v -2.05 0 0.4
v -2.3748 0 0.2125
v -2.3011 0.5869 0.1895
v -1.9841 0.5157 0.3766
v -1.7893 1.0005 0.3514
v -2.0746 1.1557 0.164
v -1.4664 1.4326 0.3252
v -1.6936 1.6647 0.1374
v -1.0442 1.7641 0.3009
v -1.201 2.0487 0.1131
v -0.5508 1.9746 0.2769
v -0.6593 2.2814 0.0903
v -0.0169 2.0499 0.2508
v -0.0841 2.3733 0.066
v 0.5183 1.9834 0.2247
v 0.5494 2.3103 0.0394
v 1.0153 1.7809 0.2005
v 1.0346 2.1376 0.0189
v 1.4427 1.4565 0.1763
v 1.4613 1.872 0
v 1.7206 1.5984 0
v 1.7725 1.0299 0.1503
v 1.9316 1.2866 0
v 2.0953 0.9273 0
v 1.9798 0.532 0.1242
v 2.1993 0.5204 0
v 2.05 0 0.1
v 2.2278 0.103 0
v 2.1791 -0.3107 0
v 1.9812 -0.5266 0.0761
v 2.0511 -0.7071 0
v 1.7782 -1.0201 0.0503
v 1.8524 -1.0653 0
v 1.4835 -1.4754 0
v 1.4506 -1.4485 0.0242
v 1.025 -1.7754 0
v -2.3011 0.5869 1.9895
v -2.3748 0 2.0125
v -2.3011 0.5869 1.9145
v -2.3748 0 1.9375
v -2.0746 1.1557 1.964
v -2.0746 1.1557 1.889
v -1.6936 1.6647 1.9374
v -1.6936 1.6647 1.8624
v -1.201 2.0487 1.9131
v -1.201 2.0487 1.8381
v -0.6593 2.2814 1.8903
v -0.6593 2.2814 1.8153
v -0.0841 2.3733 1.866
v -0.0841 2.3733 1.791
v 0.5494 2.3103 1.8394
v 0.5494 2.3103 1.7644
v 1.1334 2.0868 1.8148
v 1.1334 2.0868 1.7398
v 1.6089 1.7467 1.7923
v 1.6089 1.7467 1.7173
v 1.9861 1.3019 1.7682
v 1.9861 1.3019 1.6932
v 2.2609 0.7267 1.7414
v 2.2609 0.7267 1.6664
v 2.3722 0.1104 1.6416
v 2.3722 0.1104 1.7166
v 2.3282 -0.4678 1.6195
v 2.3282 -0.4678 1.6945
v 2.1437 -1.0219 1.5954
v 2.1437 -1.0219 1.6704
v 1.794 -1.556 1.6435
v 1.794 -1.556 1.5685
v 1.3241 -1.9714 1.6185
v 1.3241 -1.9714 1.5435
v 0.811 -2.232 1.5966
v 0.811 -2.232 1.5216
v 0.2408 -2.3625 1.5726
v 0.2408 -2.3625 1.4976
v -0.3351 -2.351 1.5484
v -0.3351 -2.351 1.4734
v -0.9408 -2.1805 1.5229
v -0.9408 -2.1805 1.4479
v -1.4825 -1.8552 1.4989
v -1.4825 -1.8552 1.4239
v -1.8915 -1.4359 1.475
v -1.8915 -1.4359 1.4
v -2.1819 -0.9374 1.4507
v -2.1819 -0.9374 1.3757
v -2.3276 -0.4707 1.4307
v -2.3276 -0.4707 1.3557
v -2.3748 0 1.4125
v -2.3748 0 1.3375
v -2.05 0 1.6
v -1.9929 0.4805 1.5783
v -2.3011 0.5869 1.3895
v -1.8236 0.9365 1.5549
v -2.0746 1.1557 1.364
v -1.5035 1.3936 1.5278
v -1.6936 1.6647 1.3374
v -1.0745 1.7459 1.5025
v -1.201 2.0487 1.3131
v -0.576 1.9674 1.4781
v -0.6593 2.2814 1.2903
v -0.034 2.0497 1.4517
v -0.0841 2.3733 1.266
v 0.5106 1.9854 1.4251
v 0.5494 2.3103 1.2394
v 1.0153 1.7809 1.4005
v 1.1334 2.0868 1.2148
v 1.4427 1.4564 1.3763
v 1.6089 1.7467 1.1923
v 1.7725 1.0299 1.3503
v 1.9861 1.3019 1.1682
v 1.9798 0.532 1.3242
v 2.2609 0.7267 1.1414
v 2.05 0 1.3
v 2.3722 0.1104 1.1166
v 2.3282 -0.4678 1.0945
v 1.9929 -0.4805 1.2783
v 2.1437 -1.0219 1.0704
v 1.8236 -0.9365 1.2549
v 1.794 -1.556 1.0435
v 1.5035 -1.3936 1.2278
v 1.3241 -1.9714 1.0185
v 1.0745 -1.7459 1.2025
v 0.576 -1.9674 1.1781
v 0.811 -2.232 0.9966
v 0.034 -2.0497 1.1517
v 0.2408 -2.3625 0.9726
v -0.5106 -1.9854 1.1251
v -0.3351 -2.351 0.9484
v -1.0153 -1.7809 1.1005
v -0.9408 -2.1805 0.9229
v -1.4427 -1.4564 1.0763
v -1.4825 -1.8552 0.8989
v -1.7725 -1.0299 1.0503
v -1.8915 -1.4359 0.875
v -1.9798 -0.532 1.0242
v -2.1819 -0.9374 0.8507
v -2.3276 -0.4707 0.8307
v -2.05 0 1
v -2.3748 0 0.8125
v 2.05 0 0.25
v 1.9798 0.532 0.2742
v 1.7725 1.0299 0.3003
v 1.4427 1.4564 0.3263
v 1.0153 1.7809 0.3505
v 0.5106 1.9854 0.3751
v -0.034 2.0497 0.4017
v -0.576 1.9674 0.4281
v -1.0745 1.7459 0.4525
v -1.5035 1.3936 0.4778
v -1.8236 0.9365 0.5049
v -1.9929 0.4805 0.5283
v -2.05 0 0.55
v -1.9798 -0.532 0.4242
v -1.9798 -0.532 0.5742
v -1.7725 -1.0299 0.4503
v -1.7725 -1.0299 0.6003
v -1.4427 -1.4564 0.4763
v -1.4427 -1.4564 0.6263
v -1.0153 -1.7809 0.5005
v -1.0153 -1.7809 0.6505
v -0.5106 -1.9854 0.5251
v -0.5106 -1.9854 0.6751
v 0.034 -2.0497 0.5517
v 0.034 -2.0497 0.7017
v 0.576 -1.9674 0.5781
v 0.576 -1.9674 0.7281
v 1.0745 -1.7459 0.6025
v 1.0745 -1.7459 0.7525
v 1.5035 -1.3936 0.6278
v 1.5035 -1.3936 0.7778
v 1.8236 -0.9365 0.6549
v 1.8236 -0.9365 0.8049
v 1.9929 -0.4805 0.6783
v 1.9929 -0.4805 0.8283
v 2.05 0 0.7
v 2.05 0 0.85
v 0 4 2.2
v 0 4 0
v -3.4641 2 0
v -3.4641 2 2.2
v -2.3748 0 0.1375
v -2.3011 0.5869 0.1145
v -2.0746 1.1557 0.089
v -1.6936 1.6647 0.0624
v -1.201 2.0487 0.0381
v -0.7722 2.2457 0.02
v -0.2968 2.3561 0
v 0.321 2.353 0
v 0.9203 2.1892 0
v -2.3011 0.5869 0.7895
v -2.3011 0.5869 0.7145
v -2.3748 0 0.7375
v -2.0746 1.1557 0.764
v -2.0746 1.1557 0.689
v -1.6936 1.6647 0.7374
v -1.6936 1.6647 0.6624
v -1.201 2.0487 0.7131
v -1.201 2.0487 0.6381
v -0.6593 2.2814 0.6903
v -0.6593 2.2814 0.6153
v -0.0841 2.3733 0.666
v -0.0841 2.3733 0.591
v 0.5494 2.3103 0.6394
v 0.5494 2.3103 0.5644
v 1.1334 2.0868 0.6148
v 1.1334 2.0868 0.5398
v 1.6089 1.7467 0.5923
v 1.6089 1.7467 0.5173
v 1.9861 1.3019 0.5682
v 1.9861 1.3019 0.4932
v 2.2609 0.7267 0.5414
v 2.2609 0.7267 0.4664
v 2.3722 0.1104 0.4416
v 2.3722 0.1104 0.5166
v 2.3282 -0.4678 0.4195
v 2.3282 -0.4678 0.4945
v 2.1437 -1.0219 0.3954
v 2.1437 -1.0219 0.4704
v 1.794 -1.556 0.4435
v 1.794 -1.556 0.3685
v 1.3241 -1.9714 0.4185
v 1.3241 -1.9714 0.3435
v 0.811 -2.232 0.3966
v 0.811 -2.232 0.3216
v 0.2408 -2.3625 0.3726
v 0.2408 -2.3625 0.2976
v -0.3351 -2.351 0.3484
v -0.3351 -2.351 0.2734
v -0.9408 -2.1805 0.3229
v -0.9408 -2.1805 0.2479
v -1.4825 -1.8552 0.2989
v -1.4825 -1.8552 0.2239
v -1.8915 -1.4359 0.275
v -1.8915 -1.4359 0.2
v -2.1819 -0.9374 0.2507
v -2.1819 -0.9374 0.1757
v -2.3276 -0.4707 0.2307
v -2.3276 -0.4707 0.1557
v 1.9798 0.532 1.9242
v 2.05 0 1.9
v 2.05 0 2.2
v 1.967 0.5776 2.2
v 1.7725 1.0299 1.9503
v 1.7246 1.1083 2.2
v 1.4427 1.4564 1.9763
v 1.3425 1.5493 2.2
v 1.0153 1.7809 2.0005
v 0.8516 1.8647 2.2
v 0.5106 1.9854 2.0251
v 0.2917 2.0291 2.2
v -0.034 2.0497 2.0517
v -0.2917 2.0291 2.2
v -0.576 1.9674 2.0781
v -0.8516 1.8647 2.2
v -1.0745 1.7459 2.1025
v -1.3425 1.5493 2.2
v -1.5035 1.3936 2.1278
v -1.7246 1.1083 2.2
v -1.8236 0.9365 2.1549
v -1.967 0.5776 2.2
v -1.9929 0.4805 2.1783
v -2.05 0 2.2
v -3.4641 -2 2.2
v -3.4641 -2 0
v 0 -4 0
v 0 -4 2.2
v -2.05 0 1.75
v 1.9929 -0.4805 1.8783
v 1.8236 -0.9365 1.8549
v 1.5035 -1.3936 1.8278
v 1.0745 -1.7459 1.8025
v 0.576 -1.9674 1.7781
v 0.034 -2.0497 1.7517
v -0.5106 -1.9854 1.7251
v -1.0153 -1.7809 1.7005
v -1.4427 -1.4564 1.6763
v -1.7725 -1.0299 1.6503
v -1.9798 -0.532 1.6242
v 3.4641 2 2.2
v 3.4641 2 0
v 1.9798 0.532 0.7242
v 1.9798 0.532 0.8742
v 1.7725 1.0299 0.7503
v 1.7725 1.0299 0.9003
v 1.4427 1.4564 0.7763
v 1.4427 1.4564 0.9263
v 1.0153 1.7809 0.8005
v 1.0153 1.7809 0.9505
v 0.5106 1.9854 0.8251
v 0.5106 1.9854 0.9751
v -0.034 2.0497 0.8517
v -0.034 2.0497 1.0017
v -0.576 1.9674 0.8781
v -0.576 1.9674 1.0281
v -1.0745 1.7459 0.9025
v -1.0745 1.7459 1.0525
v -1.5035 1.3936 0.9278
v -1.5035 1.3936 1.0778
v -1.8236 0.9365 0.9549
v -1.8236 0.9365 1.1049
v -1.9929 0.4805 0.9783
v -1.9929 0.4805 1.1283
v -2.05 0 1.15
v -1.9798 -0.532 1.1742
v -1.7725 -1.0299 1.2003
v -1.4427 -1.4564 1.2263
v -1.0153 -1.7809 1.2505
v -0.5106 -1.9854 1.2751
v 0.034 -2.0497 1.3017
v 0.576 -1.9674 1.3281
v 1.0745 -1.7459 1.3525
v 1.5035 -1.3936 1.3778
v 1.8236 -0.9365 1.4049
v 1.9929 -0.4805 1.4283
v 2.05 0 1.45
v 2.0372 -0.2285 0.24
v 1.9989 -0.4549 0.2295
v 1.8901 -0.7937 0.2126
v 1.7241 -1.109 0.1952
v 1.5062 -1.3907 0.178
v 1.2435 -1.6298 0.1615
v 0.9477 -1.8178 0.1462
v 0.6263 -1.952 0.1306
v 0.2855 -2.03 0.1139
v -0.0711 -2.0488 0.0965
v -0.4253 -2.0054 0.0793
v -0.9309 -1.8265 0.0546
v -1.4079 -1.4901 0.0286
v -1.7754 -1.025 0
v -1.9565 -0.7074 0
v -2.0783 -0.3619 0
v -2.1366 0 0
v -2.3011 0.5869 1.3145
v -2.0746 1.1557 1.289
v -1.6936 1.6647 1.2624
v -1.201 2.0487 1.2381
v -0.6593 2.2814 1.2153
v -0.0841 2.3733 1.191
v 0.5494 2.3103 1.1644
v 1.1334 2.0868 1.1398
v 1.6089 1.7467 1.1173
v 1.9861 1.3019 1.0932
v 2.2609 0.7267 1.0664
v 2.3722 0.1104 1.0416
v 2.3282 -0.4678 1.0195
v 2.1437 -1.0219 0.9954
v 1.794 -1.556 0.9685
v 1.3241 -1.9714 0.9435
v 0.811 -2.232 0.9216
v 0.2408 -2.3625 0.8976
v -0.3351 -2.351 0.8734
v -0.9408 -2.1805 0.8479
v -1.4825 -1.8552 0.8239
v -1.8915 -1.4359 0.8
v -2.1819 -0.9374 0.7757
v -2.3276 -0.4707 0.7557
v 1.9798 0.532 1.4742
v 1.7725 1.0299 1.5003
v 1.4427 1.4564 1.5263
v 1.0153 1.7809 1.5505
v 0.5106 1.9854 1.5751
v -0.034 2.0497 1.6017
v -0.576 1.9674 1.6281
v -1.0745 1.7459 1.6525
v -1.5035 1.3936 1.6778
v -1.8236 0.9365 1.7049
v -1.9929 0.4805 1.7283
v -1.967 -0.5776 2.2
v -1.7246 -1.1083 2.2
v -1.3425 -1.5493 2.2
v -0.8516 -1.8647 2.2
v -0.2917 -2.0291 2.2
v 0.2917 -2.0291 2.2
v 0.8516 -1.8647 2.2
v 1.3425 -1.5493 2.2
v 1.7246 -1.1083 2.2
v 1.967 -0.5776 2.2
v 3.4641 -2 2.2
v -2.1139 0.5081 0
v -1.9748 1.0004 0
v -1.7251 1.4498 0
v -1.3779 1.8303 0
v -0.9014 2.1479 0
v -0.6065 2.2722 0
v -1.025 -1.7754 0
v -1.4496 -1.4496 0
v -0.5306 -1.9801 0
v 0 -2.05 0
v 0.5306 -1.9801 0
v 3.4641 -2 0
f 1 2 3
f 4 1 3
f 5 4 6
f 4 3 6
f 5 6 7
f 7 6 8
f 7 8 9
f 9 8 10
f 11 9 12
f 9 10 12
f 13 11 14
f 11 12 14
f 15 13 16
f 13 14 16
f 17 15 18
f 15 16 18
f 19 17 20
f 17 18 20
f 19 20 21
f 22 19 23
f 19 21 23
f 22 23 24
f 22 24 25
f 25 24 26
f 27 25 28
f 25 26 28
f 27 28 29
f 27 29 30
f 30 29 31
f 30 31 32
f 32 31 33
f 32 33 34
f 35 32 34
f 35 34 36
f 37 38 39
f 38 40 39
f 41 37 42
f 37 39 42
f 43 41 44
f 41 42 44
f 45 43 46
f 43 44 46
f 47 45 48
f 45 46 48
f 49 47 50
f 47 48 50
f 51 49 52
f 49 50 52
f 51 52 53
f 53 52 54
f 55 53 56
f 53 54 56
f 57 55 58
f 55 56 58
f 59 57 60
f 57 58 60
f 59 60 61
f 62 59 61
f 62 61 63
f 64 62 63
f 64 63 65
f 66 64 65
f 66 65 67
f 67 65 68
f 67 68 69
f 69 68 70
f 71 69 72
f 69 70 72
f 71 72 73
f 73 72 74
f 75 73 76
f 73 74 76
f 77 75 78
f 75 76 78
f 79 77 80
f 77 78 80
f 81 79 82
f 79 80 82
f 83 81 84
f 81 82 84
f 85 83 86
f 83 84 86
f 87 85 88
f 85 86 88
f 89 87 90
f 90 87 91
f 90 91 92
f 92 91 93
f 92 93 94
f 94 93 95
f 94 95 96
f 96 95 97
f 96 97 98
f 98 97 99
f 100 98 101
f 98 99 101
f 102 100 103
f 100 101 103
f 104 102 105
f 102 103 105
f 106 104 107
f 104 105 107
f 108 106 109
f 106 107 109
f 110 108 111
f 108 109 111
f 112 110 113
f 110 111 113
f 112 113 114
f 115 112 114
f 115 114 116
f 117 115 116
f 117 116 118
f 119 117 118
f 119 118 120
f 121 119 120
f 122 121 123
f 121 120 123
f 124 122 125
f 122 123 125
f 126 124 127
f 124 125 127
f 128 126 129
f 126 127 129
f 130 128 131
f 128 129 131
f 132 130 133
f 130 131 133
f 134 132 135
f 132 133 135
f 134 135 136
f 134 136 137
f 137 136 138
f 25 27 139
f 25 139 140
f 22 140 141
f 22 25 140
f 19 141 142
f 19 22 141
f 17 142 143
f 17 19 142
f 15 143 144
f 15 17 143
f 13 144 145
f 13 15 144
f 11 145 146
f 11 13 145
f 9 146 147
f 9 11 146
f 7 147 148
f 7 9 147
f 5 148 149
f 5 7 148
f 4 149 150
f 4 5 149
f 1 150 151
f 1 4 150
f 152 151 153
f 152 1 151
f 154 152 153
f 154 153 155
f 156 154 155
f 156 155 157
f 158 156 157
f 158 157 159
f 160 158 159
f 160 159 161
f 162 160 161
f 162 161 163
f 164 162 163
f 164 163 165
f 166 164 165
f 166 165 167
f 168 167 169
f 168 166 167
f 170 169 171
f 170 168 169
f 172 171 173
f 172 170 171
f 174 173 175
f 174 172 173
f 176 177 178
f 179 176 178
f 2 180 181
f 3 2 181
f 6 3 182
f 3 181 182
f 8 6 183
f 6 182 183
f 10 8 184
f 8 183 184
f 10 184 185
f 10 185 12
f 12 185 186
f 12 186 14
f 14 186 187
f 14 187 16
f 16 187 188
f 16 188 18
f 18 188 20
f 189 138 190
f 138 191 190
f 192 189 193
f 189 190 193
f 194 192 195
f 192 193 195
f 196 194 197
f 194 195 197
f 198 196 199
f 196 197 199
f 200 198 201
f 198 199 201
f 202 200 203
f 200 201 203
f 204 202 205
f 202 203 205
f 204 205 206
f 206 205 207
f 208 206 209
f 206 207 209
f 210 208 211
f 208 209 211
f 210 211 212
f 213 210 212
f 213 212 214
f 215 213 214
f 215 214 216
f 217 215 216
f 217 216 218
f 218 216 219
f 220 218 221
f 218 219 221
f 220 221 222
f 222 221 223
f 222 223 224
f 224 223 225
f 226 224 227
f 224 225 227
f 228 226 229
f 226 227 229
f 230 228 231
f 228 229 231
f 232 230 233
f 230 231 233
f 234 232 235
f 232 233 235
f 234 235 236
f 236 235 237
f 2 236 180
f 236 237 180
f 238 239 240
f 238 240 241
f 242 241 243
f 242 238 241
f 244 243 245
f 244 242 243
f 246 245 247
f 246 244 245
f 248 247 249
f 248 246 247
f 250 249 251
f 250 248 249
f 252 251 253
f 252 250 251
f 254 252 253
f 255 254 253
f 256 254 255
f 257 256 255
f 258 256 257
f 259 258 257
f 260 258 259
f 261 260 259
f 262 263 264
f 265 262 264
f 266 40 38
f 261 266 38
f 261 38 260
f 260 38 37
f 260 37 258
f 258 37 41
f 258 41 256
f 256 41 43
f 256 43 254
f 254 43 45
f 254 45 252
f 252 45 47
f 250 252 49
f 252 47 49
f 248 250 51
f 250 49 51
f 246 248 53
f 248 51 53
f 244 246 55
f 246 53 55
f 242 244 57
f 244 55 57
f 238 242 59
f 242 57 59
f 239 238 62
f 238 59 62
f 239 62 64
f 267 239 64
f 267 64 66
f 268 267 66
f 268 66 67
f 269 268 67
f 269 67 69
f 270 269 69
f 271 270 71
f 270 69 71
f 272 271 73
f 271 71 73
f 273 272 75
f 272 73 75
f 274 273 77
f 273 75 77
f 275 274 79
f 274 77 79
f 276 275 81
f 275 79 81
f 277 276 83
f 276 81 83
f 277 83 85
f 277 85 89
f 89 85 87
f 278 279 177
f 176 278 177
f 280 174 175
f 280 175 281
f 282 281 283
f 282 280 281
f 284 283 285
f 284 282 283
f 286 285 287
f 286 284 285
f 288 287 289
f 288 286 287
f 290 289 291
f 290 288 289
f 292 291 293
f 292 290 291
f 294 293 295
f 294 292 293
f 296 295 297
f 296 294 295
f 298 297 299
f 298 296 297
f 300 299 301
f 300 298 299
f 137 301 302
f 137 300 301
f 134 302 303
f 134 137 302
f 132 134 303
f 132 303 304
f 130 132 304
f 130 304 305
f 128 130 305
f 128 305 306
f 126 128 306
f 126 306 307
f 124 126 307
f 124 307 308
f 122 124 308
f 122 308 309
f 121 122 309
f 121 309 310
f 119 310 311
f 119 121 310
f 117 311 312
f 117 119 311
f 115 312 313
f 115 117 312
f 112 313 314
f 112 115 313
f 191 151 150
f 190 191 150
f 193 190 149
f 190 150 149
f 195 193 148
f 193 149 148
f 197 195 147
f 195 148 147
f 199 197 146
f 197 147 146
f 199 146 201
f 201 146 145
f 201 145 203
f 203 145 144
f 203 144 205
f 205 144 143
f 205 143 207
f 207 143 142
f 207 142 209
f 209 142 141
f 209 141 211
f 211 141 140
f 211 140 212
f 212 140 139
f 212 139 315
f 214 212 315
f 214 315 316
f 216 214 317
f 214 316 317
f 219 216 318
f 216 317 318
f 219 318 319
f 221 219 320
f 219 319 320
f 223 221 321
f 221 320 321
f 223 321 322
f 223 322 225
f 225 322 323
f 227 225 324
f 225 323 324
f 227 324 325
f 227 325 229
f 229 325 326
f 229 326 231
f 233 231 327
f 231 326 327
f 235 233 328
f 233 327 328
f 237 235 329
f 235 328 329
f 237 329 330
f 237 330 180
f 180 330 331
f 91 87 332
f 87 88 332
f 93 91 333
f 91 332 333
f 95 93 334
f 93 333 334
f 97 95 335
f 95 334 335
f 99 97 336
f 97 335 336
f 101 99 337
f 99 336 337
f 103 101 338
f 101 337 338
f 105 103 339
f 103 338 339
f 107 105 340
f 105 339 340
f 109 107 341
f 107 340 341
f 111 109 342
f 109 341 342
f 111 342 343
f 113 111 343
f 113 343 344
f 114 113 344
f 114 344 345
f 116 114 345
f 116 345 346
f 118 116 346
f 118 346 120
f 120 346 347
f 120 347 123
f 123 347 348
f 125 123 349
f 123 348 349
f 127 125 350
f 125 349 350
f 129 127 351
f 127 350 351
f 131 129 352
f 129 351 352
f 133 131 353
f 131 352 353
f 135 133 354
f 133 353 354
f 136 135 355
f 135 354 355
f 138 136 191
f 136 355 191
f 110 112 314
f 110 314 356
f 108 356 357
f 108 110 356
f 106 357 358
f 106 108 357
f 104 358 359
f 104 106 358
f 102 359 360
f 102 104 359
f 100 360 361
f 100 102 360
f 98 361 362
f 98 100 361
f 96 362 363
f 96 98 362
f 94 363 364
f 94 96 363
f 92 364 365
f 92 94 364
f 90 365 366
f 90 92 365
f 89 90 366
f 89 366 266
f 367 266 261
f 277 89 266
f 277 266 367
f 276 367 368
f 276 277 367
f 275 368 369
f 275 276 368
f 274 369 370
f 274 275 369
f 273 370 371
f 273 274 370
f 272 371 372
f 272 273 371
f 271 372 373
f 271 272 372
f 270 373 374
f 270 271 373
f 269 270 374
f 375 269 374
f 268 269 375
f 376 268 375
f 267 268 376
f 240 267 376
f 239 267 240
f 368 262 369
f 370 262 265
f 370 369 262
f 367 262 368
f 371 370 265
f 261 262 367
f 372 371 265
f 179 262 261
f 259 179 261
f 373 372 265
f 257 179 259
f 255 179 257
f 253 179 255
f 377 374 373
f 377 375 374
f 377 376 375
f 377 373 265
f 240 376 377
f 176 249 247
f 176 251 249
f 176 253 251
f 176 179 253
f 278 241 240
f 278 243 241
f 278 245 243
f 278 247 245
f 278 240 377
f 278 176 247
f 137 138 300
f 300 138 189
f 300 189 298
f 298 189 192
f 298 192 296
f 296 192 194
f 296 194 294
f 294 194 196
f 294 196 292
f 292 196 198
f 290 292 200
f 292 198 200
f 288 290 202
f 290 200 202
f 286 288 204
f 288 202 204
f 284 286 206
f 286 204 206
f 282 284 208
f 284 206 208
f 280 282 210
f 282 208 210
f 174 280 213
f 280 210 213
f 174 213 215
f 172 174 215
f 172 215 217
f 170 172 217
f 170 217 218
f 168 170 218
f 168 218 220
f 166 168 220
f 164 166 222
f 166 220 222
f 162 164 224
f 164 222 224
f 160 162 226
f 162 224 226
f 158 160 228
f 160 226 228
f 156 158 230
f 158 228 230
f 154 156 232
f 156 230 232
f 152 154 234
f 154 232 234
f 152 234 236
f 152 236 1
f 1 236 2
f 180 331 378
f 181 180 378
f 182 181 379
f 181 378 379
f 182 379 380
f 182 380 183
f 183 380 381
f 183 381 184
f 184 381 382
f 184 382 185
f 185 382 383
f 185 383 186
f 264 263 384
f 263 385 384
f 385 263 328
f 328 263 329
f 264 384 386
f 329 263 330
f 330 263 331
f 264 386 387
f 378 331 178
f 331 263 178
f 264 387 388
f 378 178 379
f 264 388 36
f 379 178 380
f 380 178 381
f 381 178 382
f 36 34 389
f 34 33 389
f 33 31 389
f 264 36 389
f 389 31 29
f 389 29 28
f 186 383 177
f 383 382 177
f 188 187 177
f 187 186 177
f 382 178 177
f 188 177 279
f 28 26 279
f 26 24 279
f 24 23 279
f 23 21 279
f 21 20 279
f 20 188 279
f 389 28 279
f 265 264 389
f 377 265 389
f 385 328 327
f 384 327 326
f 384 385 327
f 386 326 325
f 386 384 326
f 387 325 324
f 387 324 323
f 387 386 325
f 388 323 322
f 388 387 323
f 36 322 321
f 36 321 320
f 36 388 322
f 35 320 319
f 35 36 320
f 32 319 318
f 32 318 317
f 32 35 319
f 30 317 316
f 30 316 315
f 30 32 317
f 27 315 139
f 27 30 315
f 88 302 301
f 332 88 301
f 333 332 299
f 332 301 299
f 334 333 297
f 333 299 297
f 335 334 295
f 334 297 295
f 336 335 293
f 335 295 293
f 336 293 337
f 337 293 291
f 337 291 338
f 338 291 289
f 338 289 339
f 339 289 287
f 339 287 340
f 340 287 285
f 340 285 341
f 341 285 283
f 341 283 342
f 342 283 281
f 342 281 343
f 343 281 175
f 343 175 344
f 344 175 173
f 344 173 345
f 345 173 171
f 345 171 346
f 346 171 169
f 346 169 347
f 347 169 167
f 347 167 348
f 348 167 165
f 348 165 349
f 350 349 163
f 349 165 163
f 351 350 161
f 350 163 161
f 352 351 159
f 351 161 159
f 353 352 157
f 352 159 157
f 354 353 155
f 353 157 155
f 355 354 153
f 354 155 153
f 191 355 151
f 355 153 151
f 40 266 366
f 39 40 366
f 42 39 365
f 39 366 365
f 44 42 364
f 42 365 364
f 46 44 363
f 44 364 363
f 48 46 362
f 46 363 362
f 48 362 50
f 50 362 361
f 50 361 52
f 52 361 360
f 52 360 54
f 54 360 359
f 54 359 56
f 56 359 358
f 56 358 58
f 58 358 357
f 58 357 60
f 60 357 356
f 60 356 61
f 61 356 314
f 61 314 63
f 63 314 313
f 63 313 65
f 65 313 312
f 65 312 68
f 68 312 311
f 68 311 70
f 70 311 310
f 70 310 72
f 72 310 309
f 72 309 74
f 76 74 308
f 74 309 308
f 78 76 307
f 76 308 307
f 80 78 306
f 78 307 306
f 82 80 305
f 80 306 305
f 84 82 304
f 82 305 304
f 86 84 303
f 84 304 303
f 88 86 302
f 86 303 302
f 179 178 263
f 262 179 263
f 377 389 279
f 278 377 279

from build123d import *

# Parameters (mm, degrees)
SKETCH1_R           = 2.05
BOSS_EXTRUDE1_DEPTH = 2.2
THREAD1_PITCH       = 0.6


with BuildPart() as part:
    # Sketch1 → Boss-Extrude1 (new body)
    with BuildSketch(Plane.XY):
        Polygon((-3.464101615, -2), (0, -4), (3.464101615, -2), (3.464101615, 2), (0, 4), (-3.464101615, 2), align=None)
        Circle(SKETCH1_R, mode=Mode.SUBTRACT)
    extrude(amount=BOSS_EXTRUDE1_DEPTH)

    # Thread1: the profile of Thread Profile1 profile screwed along a right-hand helix of 3.666667 turns, 6 arcs to a turn; built about Z, then put on its axis
    thread1_z = Axis((0, 0, 0), (0, 0, 1))
    thread1_corners = [(2.0497, 0, -0.000173205), (2.374759525, 0, 0.187499999), (2.374759525, 0, 0.262499999), (2.0497, 0, 0.450173203)]
    with BuildLine(mode=Mode.PRIVATE) as thread1_profile:
        Line(thread1_corners[0], thread1_corners[1])
        Line(thread1_corners[1], thread1_corners[2])
        Line(thread1_corners[2], thread1_corners[3])
        Line(thread1_corners[3], thread1_corners[0])
    thread1_cap = Face(thread1_profile.wire())
    thread1_turn_angles = [0, 30, 60, 90, 120, 150, 180, 210, 240, 270, 300, 330, 360]
    thread1_turn_weights = [1, 0.8660254037844387, 1, 0.8660254037844387, 1, 0.8660254037844387, 1, 0.8660254037844387, 1, 0.8660254037844387, 1, 0.8660254037844387, 1]
    thread1_turn_rails = [Edge.make_bspline([Vector(p[0], p[1], 0).rotate(thread1_z, thread1_turn_angles[k]) / thread1_turn_weights[k] + Vector(0, 0, p[2] + THREAD1_PITCH * thread1_turn_angles[k] / 360) for k in range(13)], [0, 0, 0, 1, 1, 2, 2, 3, 3, 4, 4, 5, 5, 6, 6, 6], 2, thread1_turn_weights) for p in thread1_corners]
    thread1_turn_sides = [Face.make_surface_from_curves(thread1_turn_rails[p[0]], thread1_turn_rails[p[1]]) for p in [(0, 1), (1, 2), (2, 3), (3, 0)]]
    thread1_last_angles = [1080, 1110, 1140, 1170, 1200, 1230, 1260, 1290, 1320]
    thread1_last_weights = [1, 0.8660254037844387, 1, 0.8660254037844387, 1, 0.8660254037844387, 1, 0.8660254037844377, 1]
    thread1_last_rails = [Edge.make_bspline([Vector(p[0], p[1], 0).rotate(thread1_z, thread1_last_angles[k]) / thread1_last_weights[k] + Vector(0, 0, p[2] + THREAD1_PITCH * thread1_last_angles[k] / 360) for k in range(9)], [0, 0, 0, 1, 1, 2, 2, 3, 3, 4, 4, 4], 2, thread1_last_weights) for p in thread1_corners]
    thread1_last_sides = [Face.make_surface_from_curves(thread1_last_rails[p[0]], thread1_last_rails[p[1]]) for p in [(0, 1), (1, 2), (2, 3), (3, 0)]]
    thread1 = Plane(origin=(0, 0, 2.2), x_dir=(-1, 0, 0), z_dir=(0, 0, -1)) * Solid(Shell([*[p.moved(Location((0, 0, THREAD1_PITCH * i))) for i in range(3) for p in thread1_turn_sides], *thread1_last_sides, thread1_cap, thread1_cap.rotate(thread1_z, 1320).moved(Location((0, 0, THREAD1_PITCH * 1320 / 360)))]))
    add(thread1, mode=Mode.SUBTRACT)


solid = part.part
